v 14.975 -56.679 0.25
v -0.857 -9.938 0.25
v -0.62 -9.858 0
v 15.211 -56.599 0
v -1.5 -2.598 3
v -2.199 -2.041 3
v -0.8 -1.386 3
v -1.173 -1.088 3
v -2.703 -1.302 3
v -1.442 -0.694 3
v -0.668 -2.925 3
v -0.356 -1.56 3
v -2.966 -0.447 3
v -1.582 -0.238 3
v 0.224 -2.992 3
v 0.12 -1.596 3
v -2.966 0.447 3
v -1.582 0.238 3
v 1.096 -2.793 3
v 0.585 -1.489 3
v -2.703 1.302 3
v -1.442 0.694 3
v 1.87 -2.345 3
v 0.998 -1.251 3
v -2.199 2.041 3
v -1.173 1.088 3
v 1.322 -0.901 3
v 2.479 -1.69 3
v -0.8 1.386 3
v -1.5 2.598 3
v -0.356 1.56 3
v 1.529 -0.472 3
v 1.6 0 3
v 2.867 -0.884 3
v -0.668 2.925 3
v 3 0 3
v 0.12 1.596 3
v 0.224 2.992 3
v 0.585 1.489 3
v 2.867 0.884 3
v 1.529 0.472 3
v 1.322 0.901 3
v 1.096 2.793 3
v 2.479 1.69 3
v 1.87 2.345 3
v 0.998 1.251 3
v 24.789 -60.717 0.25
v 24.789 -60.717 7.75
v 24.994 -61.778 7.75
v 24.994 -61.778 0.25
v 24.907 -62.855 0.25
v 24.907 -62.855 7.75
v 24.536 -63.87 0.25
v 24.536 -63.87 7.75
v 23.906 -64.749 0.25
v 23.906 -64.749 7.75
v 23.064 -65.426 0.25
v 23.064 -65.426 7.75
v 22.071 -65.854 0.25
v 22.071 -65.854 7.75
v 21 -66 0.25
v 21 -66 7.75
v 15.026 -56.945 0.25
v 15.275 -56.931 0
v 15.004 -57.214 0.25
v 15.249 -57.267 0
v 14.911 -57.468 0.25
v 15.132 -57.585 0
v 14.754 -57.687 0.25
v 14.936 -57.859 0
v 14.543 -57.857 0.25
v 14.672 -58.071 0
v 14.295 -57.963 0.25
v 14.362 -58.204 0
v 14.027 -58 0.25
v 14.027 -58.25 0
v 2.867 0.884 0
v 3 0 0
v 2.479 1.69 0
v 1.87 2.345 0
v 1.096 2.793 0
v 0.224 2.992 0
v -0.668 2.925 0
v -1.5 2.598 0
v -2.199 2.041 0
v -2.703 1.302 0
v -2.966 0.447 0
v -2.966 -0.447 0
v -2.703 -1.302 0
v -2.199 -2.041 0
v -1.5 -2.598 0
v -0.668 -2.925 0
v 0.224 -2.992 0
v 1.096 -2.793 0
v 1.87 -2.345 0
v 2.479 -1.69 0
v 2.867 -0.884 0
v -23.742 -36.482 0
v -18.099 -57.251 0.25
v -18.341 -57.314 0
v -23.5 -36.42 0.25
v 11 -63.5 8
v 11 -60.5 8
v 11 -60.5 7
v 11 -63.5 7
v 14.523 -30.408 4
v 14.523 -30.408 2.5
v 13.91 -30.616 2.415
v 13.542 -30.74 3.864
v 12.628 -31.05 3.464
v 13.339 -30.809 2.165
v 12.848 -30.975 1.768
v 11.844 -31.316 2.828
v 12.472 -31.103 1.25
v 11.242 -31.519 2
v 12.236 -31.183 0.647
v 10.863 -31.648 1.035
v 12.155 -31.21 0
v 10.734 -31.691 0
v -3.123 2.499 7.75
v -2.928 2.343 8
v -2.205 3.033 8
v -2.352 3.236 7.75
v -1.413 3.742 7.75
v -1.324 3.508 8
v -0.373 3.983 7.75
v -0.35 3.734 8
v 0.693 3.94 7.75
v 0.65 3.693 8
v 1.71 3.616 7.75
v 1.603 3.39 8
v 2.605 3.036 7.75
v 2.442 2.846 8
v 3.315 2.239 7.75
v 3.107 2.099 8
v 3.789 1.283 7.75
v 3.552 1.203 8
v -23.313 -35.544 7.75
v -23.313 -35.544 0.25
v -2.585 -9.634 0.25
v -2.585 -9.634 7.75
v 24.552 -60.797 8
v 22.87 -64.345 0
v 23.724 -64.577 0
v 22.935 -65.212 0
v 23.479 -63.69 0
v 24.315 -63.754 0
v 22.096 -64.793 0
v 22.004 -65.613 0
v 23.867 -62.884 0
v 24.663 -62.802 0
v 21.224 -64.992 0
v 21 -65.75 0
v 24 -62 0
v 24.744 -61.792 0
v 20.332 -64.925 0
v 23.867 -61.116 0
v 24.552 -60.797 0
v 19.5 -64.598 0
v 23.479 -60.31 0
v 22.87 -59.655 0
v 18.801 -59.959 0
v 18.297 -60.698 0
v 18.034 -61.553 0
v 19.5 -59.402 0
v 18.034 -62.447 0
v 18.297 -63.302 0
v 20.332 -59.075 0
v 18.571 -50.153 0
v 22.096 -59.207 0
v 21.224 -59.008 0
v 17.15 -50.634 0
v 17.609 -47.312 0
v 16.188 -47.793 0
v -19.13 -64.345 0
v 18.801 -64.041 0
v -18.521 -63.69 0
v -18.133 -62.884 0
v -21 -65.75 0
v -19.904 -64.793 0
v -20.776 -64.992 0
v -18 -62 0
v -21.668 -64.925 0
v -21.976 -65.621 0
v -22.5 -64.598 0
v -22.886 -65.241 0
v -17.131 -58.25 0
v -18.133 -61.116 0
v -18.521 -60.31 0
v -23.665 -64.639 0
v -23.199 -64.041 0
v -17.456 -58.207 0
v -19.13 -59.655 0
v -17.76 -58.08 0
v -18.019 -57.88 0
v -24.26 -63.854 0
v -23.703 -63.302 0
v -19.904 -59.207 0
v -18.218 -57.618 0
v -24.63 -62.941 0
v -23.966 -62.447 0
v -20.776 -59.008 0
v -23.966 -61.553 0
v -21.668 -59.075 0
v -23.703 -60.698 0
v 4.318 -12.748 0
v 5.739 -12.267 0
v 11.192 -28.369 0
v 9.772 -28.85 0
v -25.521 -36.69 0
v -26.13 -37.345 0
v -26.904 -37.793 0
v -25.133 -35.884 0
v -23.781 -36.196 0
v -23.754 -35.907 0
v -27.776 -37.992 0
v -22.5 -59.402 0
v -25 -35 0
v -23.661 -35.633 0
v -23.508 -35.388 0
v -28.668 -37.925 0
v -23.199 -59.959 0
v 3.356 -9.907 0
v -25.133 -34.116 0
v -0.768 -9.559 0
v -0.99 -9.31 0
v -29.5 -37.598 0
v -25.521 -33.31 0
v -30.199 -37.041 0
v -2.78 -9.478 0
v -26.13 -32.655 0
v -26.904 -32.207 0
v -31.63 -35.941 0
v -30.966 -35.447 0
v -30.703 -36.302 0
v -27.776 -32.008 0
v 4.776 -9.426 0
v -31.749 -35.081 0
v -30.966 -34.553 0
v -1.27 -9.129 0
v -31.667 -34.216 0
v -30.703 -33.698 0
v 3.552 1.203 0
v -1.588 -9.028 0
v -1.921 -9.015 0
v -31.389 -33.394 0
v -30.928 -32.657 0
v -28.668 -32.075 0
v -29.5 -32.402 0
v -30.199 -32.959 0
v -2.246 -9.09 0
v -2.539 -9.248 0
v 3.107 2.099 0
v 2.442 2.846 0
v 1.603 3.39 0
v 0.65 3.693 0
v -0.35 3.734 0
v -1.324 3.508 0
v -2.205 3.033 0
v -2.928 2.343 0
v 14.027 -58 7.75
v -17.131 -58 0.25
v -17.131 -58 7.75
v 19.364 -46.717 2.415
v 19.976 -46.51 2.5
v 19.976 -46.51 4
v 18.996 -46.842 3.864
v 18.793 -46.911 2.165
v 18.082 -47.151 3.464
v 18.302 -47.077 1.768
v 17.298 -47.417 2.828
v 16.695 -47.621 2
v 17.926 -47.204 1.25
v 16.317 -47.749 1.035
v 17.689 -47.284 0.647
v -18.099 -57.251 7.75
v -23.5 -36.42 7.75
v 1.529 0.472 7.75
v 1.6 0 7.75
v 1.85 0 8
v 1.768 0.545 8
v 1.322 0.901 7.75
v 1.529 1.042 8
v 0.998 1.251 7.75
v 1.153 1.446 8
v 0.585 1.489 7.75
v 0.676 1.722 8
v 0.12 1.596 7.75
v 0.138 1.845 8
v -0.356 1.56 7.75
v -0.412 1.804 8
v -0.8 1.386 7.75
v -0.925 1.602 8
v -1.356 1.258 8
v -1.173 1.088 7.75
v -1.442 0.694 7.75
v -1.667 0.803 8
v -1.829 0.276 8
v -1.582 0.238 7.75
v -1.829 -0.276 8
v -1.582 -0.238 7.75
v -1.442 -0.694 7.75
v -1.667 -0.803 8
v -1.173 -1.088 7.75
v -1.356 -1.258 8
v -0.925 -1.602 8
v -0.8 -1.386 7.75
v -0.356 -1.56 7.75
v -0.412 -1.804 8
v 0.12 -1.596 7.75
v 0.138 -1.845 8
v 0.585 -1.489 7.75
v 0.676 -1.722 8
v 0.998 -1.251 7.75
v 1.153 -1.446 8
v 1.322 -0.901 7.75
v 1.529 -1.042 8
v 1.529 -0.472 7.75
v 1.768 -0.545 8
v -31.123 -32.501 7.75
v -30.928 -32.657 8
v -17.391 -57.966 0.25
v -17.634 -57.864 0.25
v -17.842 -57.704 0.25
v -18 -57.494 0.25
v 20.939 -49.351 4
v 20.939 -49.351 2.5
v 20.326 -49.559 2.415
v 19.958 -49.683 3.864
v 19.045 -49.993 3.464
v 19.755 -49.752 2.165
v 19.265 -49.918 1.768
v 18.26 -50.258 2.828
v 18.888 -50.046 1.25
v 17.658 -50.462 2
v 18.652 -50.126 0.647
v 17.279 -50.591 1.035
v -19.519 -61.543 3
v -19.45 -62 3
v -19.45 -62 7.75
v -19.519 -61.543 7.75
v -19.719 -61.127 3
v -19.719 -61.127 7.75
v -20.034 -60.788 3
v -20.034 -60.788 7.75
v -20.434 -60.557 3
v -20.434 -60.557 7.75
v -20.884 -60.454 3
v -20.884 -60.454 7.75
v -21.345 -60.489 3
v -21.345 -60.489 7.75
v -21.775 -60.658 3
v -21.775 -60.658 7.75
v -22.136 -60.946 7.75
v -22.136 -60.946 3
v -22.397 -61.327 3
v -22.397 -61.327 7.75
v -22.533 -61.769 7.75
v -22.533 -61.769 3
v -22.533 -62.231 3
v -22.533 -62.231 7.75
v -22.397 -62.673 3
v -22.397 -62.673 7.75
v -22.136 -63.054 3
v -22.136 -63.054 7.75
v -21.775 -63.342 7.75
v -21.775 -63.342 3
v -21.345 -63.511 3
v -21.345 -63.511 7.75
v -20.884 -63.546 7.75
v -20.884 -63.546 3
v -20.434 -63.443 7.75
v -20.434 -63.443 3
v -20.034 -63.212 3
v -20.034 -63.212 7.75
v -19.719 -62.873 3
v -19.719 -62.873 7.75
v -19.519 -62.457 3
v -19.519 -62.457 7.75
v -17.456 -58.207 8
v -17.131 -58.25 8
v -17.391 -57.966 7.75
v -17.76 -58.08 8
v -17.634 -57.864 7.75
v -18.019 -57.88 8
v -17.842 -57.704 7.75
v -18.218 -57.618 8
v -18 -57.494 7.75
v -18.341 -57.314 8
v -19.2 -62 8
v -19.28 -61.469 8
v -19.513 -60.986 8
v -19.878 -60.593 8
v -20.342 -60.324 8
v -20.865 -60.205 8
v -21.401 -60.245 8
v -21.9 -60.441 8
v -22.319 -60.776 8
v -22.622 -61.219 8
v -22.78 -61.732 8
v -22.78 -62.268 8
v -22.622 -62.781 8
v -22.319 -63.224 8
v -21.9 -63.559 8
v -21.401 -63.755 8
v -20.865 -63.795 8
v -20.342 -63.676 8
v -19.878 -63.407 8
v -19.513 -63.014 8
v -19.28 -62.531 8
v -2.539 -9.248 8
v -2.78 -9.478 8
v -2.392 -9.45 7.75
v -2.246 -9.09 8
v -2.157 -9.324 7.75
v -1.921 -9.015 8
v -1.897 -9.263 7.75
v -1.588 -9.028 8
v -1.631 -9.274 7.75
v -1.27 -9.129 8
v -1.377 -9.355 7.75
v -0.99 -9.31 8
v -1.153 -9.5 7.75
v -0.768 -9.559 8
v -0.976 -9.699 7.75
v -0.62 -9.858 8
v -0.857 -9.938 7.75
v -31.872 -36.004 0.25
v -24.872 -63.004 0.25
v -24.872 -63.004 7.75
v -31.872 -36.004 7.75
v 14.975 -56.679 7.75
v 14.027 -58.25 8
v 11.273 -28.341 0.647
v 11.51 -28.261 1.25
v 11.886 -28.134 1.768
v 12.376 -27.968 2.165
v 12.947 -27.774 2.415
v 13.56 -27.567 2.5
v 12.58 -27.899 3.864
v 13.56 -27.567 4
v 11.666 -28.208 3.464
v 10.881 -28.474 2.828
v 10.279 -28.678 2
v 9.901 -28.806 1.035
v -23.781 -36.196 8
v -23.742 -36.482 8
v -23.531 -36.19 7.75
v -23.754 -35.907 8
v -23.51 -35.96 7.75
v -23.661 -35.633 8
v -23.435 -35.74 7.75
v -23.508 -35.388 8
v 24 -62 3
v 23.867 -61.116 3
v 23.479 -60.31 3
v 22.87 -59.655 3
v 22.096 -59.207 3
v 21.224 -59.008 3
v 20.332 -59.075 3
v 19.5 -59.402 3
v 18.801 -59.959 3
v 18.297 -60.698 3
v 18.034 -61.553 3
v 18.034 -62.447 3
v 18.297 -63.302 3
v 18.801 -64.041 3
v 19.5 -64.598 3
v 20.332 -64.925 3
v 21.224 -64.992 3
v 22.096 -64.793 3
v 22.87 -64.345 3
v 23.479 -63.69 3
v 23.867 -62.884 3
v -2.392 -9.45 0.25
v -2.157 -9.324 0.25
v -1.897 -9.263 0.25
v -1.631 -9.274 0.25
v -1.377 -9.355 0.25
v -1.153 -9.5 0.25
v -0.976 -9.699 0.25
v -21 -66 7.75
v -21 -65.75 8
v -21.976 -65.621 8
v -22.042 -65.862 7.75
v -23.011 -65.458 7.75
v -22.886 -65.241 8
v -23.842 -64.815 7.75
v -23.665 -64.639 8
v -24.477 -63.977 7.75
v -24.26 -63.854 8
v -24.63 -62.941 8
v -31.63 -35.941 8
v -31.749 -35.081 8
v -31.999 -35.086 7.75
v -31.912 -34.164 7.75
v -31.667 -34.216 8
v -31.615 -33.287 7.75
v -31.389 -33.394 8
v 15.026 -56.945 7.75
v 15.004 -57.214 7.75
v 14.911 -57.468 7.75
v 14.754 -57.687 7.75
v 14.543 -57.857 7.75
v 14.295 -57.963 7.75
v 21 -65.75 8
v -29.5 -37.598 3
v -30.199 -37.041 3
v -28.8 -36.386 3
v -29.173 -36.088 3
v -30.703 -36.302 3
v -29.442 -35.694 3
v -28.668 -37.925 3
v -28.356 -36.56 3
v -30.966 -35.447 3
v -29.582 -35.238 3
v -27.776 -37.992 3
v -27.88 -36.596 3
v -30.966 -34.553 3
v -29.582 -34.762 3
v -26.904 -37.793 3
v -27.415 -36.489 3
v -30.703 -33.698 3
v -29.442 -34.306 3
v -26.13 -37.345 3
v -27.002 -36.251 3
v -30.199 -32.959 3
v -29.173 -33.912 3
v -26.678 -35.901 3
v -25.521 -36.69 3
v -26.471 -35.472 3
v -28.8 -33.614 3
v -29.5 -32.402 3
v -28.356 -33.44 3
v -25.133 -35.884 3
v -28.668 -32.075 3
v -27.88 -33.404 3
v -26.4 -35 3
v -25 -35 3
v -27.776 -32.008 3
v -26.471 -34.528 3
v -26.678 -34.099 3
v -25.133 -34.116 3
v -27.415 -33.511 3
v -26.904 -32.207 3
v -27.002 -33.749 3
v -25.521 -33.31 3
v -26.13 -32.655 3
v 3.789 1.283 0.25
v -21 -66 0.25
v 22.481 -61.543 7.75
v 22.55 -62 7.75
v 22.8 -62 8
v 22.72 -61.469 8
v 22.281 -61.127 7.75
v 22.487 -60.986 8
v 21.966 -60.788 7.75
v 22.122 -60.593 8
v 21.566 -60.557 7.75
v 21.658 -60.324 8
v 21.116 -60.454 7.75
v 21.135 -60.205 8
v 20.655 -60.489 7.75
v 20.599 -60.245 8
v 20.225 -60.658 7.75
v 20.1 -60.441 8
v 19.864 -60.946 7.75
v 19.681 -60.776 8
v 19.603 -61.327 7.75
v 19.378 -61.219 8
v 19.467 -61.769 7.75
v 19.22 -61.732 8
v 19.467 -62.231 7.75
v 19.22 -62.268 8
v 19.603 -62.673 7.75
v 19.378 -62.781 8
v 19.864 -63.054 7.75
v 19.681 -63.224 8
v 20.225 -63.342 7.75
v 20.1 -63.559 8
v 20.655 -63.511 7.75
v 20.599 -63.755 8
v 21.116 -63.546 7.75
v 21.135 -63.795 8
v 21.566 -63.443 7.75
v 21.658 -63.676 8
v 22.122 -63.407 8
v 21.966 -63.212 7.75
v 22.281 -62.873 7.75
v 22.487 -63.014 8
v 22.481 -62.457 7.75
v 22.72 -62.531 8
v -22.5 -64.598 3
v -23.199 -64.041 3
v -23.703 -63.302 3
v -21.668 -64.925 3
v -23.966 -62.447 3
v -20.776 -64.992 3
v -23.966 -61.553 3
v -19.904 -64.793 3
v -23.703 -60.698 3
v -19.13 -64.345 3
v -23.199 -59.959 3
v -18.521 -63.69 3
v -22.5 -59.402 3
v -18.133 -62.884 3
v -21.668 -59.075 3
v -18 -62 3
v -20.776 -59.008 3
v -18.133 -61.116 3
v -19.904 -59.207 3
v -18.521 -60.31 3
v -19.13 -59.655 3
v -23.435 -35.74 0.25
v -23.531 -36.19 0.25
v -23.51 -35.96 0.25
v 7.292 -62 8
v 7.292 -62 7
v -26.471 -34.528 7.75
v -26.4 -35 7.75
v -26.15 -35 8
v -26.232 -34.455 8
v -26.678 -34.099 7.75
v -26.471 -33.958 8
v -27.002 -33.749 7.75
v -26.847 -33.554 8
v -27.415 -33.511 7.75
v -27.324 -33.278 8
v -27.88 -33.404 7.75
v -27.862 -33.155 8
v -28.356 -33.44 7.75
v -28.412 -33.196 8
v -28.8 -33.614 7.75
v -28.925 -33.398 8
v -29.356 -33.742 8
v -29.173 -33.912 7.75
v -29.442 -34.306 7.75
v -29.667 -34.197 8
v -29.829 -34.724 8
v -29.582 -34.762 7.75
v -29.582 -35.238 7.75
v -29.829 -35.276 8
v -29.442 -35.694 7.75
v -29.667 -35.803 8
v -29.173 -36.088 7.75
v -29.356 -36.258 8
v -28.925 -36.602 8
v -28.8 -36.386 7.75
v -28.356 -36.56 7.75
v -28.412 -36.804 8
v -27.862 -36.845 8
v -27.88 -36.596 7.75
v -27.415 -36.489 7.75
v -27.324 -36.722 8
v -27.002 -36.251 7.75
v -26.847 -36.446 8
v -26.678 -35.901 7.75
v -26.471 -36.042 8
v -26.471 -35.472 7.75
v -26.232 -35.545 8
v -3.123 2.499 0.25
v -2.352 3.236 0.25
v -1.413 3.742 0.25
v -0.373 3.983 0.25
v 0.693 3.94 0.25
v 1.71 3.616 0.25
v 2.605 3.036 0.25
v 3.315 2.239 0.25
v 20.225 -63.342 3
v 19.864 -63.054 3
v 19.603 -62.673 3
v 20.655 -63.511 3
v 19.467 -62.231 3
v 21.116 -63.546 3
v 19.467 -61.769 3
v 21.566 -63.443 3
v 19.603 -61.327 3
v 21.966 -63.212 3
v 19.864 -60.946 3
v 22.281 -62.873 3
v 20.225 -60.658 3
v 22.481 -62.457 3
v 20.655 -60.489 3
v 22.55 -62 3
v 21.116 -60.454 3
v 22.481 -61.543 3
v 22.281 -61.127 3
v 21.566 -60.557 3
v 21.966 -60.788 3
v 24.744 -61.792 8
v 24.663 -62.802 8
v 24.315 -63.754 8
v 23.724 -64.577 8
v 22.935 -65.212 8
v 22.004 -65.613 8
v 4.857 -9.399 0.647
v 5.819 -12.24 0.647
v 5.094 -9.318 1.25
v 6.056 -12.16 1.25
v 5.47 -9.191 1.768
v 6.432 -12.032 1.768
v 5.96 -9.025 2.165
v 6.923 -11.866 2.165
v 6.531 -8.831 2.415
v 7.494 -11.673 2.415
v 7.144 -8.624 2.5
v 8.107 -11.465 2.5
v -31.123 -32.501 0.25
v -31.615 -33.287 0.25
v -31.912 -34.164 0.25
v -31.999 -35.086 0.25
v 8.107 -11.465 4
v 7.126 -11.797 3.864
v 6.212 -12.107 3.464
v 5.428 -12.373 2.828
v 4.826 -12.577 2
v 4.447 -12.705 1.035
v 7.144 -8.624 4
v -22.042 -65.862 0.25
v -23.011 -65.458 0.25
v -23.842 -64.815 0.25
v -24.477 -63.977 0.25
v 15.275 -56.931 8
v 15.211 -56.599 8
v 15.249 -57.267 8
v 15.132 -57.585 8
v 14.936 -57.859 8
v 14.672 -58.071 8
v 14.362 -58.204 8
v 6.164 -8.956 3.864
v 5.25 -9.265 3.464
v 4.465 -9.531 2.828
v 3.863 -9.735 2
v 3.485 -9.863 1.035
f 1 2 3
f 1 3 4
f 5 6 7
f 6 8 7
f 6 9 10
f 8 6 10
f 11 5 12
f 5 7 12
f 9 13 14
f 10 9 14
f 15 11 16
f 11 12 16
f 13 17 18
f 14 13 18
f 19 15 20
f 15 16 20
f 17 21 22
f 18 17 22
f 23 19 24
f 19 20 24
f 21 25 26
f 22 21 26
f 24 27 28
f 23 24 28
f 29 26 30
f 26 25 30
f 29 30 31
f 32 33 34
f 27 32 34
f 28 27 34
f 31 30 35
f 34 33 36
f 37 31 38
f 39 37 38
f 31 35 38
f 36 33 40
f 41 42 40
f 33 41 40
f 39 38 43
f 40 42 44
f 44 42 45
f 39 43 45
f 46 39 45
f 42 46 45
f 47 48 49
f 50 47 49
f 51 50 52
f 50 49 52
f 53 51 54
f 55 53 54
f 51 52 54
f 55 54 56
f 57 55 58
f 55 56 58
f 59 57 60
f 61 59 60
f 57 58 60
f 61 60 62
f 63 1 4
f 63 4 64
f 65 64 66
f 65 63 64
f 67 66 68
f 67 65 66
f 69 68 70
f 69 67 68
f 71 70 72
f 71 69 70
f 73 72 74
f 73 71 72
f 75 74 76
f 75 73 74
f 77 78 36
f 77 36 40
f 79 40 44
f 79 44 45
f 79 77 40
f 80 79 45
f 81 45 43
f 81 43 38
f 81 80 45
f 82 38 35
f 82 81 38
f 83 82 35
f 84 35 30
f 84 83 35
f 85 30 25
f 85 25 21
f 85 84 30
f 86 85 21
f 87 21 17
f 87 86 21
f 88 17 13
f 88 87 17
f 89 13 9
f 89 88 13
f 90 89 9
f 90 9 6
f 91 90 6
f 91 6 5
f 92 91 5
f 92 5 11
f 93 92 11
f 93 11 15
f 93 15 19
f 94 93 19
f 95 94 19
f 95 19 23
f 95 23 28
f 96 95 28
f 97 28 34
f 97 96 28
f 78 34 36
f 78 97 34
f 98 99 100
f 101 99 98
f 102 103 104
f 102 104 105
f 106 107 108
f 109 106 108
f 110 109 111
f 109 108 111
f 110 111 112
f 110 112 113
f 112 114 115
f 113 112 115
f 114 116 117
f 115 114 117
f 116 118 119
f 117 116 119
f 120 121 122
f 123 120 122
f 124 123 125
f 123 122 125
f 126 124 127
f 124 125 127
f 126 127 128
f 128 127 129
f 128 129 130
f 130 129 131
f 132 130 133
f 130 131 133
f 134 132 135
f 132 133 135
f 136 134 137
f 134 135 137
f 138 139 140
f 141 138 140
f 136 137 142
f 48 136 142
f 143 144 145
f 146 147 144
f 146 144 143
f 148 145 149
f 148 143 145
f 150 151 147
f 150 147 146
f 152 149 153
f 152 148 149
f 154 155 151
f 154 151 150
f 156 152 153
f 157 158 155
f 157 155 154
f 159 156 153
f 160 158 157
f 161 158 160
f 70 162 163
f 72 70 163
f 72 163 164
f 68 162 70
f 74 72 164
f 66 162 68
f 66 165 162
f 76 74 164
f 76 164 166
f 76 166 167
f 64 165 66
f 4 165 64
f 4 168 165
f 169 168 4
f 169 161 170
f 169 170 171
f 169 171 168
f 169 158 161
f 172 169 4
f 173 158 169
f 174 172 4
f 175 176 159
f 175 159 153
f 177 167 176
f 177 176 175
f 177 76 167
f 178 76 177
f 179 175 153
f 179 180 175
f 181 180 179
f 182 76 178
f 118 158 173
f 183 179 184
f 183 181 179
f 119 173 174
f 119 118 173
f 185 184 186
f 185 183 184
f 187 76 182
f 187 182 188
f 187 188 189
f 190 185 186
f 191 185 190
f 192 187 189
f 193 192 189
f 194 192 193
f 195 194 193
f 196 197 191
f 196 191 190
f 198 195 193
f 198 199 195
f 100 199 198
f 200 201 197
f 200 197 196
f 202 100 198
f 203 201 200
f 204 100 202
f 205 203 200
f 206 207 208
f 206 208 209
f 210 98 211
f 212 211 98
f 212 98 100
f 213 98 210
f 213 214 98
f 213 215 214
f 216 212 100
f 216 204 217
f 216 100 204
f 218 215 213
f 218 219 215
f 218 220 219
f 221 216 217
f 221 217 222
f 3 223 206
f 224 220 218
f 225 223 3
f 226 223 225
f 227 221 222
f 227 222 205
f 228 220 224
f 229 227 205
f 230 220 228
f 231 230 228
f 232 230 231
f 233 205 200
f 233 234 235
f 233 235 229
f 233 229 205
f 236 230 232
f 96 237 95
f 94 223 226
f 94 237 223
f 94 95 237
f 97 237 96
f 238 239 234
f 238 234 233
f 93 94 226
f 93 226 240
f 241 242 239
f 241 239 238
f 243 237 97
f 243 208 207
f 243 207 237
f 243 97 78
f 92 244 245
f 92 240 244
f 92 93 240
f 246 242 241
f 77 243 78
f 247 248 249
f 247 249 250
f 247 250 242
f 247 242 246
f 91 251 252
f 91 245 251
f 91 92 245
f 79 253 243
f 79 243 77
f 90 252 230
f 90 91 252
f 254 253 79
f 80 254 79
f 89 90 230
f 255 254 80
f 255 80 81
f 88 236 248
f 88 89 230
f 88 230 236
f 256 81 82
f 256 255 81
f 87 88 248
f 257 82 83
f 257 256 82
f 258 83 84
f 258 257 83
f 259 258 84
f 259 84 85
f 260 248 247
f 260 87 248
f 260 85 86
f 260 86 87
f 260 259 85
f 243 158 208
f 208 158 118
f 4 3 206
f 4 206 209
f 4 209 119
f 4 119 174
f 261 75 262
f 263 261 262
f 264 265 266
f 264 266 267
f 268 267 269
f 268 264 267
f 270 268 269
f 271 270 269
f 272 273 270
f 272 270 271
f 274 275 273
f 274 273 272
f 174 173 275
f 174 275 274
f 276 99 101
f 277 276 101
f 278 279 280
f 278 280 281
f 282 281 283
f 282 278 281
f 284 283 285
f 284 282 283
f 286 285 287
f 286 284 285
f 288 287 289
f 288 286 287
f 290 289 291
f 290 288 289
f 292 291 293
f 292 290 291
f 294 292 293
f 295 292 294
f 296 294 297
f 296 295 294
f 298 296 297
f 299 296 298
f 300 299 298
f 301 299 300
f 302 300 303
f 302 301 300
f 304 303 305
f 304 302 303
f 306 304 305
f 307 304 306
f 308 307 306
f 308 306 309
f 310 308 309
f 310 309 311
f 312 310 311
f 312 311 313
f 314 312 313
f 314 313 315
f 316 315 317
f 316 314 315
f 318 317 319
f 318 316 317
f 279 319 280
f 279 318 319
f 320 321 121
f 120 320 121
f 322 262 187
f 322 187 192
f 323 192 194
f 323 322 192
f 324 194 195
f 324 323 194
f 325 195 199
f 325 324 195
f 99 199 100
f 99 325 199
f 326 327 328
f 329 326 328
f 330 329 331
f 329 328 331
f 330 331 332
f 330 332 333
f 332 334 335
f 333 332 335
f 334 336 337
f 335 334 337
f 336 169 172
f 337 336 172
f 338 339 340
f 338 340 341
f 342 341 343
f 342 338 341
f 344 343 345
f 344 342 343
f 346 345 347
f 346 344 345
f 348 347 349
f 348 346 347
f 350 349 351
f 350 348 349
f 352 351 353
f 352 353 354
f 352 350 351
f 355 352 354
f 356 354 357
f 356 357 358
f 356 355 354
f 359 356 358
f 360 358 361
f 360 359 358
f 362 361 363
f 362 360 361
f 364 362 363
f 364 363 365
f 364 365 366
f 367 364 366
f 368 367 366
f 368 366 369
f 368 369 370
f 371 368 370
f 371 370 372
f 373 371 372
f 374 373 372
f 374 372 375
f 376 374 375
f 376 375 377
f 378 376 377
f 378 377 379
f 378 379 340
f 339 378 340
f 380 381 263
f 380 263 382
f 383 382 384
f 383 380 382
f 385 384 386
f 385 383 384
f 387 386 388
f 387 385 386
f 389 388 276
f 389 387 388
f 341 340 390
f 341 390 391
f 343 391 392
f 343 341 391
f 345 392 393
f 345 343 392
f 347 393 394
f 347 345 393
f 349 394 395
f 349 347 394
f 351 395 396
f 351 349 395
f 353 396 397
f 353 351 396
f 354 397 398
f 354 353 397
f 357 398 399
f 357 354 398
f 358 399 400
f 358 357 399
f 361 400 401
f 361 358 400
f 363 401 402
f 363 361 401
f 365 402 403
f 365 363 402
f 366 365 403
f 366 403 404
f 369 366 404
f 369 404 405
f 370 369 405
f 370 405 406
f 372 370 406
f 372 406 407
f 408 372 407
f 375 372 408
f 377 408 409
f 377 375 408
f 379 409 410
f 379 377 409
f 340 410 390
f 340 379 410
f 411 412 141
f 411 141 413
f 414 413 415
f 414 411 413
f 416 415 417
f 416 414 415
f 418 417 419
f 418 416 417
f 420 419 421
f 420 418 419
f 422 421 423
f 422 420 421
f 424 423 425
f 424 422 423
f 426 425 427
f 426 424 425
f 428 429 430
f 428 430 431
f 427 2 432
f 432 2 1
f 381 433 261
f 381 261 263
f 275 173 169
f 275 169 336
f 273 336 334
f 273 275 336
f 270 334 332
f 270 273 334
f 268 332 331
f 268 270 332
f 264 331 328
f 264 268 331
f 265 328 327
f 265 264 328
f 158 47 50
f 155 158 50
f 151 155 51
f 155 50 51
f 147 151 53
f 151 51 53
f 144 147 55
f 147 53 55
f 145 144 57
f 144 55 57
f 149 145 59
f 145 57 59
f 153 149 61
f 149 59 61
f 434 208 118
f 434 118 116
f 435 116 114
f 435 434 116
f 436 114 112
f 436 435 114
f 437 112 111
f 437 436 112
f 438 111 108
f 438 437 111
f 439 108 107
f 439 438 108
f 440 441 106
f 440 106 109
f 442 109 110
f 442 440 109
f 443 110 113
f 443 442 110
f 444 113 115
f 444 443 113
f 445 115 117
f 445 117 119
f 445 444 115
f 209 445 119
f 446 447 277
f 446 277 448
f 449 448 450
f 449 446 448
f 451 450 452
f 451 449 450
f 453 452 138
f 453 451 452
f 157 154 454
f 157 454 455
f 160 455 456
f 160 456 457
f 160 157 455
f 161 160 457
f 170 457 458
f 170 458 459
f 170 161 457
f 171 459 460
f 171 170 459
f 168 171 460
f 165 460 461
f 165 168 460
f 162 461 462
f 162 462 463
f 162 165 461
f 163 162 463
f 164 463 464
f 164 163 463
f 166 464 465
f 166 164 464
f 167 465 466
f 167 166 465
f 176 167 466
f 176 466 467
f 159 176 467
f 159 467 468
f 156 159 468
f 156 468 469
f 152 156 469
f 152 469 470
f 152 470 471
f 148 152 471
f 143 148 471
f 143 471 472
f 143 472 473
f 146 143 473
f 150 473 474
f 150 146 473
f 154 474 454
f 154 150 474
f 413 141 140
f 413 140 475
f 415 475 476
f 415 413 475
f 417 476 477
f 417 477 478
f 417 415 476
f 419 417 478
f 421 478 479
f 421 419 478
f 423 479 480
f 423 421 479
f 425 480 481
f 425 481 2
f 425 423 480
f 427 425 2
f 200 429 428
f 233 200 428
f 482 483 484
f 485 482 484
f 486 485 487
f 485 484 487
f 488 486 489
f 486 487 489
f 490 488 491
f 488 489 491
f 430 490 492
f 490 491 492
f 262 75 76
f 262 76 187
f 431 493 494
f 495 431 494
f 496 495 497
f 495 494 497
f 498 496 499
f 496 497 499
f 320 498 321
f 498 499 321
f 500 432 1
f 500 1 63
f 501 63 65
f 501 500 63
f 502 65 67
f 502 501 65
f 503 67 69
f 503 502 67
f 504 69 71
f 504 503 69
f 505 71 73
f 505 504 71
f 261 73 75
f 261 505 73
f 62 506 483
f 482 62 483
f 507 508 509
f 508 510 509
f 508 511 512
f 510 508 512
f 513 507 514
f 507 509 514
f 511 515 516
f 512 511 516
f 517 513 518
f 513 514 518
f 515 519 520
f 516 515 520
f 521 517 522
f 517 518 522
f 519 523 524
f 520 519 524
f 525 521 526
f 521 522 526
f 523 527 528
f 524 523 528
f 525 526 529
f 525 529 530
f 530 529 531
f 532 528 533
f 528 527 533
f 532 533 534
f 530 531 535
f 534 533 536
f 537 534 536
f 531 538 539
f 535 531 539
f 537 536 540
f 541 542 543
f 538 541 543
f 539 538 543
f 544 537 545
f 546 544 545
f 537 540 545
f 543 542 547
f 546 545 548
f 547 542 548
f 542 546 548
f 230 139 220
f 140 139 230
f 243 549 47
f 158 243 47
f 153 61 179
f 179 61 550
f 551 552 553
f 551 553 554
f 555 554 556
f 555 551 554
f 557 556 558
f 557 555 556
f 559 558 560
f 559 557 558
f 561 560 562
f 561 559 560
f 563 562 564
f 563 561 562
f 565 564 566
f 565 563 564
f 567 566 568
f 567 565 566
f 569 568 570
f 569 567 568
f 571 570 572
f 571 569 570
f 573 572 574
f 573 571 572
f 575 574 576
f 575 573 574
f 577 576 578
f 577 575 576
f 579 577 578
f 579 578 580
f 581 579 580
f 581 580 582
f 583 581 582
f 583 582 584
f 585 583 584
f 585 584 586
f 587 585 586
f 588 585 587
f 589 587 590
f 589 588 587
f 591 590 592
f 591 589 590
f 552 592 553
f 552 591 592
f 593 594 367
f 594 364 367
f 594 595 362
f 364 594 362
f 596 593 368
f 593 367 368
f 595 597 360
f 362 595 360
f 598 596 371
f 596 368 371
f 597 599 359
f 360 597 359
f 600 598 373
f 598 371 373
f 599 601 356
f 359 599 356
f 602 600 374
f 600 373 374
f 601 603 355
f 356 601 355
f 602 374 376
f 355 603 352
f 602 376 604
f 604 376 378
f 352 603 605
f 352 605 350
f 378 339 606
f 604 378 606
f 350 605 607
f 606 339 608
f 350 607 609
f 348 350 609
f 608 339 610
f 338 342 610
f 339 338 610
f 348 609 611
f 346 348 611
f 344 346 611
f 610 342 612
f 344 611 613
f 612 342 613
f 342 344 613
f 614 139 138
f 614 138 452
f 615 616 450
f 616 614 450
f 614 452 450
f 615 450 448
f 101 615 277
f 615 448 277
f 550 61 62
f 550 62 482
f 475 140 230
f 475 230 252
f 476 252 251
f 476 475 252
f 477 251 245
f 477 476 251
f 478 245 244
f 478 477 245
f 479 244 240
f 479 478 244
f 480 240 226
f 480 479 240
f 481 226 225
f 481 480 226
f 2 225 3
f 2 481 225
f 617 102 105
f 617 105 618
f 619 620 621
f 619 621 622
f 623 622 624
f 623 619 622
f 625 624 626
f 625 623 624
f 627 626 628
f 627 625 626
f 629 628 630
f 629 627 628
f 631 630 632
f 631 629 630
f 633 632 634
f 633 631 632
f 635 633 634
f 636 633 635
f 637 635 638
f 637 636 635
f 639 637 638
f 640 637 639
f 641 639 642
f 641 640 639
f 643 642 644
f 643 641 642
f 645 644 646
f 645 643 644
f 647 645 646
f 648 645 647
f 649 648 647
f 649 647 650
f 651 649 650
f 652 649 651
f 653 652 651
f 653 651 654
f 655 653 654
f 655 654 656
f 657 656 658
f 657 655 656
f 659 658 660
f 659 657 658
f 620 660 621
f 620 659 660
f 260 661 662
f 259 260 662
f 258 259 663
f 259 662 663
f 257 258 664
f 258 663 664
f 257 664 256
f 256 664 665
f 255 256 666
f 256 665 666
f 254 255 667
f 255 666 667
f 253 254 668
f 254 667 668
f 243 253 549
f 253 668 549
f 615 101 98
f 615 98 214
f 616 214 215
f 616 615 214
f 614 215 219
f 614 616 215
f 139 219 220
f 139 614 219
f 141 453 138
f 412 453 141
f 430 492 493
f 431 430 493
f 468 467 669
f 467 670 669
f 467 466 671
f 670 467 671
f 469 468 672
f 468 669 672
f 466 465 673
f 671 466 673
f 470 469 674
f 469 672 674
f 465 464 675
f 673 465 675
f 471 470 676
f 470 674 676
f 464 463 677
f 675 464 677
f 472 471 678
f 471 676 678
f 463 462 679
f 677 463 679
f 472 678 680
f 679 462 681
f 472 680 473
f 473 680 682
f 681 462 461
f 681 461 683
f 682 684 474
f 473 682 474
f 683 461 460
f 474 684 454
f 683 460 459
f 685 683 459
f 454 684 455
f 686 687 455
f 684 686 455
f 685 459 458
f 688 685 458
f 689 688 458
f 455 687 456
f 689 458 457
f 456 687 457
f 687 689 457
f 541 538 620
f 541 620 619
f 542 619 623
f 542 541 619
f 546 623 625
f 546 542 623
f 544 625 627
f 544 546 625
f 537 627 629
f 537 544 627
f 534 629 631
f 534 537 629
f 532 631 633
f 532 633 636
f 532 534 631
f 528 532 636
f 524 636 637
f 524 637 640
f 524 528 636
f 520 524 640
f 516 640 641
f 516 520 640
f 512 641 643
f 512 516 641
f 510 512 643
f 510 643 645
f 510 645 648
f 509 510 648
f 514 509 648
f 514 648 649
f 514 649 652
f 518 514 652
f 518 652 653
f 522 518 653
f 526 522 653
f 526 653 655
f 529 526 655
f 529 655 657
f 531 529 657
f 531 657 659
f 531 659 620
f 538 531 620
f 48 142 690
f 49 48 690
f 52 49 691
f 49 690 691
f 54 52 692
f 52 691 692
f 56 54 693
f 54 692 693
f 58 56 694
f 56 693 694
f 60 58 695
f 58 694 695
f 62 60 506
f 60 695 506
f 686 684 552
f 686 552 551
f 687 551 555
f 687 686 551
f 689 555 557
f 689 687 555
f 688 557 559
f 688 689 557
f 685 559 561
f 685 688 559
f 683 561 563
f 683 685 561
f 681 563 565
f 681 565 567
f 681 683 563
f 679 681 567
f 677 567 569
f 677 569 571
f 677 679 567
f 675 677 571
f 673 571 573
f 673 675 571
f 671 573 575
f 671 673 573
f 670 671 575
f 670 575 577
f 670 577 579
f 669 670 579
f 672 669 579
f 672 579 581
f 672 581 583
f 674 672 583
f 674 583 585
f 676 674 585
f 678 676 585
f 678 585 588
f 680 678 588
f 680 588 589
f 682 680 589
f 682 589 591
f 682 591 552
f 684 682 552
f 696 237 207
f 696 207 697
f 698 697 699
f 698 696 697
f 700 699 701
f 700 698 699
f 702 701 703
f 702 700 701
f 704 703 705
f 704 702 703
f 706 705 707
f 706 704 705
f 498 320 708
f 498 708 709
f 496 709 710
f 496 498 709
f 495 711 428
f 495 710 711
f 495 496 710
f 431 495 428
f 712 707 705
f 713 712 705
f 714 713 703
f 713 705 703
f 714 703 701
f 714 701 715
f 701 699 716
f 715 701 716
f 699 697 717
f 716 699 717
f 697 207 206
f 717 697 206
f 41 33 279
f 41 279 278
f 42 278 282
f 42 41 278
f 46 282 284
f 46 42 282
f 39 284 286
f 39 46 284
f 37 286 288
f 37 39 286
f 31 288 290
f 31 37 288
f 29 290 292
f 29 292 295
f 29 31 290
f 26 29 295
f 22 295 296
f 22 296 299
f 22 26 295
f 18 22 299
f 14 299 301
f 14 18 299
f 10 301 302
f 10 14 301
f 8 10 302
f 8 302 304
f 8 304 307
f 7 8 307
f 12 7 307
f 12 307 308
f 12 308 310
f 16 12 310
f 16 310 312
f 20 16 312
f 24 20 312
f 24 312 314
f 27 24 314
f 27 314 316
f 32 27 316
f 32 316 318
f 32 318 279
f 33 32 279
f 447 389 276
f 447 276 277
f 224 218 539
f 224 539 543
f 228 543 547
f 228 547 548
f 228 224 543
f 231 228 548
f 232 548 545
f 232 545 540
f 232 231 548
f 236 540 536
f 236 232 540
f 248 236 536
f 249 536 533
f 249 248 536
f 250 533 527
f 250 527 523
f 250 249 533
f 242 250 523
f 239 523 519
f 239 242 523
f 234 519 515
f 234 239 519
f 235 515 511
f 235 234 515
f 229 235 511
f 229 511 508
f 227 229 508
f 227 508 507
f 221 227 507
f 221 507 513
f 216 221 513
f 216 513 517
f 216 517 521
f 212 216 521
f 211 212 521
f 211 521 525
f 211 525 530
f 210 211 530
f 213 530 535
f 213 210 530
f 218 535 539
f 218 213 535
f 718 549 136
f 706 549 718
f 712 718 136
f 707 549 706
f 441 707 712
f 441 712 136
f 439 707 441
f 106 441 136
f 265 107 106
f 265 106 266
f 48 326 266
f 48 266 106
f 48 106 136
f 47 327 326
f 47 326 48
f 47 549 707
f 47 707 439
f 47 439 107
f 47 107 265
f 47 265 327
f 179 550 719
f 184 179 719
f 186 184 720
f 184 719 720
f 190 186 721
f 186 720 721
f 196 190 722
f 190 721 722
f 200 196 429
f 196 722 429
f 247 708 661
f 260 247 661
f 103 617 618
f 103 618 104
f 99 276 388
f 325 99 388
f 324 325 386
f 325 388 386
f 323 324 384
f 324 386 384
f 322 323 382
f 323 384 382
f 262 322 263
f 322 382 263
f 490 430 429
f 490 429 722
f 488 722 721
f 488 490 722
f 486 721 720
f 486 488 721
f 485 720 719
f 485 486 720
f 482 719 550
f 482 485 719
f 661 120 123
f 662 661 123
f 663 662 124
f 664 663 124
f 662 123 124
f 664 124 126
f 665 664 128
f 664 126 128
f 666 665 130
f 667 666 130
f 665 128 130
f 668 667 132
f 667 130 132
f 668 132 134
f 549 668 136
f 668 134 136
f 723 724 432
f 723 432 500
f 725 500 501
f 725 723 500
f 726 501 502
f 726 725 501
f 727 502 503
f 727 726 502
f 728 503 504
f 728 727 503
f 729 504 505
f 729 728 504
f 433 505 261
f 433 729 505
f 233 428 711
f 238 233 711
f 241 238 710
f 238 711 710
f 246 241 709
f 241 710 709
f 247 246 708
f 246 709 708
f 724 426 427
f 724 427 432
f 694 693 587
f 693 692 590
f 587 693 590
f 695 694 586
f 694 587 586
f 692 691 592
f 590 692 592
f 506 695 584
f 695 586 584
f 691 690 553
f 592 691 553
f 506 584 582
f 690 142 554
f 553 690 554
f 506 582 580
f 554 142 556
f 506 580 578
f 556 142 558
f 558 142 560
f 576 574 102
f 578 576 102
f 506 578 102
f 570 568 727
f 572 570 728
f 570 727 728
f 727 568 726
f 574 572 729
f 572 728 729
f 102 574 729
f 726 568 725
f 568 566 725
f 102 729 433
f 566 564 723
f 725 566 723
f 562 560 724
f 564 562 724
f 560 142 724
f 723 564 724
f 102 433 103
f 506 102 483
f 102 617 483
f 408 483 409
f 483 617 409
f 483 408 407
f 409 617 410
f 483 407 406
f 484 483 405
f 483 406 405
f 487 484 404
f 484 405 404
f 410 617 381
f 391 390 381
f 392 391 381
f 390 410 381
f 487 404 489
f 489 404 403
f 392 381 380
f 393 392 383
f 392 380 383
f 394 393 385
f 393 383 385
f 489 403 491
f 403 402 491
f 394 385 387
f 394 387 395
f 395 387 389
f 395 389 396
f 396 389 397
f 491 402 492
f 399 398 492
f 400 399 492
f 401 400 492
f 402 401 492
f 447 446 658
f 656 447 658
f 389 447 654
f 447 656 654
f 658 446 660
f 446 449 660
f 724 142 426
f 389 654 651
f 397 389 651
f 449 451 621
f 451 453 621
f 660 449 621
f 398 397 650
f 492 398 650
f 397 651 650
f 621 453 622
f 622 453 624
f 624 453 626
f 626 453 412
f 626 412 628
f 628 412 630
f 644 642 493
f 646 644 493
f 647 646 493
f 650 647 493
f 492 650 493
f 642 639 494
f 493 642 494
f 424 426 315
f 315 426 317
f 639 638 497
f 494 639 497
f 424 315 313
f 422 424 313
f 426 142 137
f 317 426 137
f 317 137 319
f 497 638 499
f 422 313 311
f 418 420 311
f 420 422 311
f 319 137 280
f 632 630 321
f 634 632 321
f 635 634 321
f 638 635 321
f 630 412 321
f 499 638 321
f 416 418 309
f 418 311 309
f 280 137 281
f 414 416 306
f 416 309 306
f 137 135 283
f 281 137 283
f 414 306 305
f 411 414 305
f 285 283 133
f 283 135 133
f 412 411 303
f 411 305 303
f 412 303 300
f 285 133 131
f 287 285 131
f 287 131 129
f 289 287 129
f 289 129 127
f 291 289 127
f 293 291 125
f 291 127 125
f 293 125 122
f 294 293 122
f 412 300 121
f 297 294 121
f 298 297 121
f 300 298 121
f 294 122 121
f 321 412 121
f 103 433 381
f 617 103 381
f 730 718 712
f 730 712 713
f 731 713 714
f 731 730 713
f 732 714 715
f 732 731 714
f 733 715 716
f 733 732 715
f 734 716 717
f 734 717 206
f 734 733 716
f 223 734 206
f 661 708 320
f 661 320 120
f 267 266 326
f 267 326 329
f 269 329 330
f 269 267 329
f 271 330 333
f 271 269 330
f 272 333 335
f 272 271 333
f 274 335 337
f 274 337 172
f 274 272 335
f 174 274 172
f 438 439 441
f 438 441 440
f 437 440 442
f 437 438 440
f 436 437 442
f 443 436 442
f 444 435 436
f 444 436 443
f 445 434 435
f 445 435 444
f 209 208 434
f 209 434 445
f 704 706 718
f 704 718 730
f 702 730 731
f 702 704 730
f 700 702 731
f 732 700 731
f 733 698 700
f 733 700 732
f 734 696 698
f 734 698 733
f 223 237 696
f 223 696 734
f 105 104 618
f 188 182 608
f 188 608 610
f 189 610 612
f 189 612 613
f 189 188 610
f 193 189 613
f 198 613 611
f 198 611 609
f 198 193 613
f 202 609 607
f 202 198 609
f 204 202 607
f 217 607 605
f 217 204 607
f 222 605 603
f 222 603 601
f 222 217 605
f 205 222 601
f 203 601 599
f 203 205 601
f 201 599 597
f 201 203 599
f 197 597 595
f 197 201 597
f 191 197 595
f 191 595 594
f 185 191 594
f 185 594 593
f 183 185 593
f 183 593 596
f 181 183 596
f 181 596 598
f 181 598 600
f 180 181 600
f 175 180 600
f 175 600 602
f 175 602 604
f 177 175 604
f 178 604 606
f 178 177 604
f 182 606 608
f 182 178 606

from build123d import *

# Parameters (mm, degrees)
SZKIC1_R                    = 1.55
SZKIC1_R_2                  = 1.6
DODANIE_WYCI_GNI_CIE1_DEPTH = 8
ZAOKR_GLENIE1_R             = 4
SZKIC2_R                    = 3
WYTNIJ_WYCI_GNI_CIE1_DEPTH  = 3
ZAOKR_GLENIE2_R             = 1
SFAZOWANIE1_SIZE            = 0.25
WYTNIJ_WYCI_GNI_CIE2_DEPTH  = 1
WYTNIJ_WYCI_GNI_CIE3_DEPTH  = 3
SZYK_LINIOWY1_COUNT         = 3
SZYK_LINIOWY1_PITCH         = 20


with BuildPart() as part:
    # Szkic1 → Dodanie-wyciągnięcie1 (new body)
    with BuildSketch(Plane.XY):
        Polygon((-32.374614688, -34.065144123), (1.443331859, 8.207289062), (26.5780588, -66), (-24.095207609, -66), align=None)
        with Locations((-21, -62)):
            Circle(SZKIC1_R, mode=Mode.SUBTRACT)
        with Locations((21, -62)):
            Circle(SZKIC1_R, mode=Mode.SUBTRACT)
        Circle(SZKIC1_R_2, mode=Mode.SUBTRACT)
        with Locations((-28, -35)):
            Circle(SZKIC1_R_2, mode=Mode.SUBTRACT)
        Polygon((-23.625385312, -35.934855877), (-1.443331859, -8.207289062), (15.4219412, -58), (-17.904792391, -58), align=None, mode=Mode.SUBTRACT)
    extrude(amount=DODANIE_WYCI_GNI_CIE1_DEPTH)

    # Zaokrąglenie1
    zaokr_glenie1_edges = [part.edges().sort_by_distance(p)[0] for p in [
        (-32.374614688, -34.065144123, 4),
        (1.443331859, 8.207289062, 4),
        (26.5780588, -66, 4),
        (-24.095207609, -66, 4),
    ]]
    fillet(zaokr_glenie1_edges, radius=ZAOKR_GLENIE1_R)

    # Szkic2 → Wytnij-wyciągnięcie1 (cut)
    with BuildSketch(Plane.XY):
        Circle(SZKIC2_R)
        with Locations((-28, -35)):
            Circle(SZKIC2_R)
        with Locations((-21, -62)):
            Circle(SZKIC2_R)
        with Locations((21, -62)):
            Circle(SZKIC2_R)
    extrude(amount=WYTNIJ_WYCI_GNI_CIE1_DEPTH, mode=Mode.SUBTRACT)

    # Zaokrąglenie2
    zaokr_glenie2_edges = [part.edges().sort_by_distance(p)[0] for p in [
        (-23.625385312, -35.934855877, 4),
        (-17.904792391, -58, 4),
        (15.4219412, -58, 4),
        (-1.443331859, -8.207289062, 4),
    ]]
    fillet(zaokr_glenie2_edges, radius=ZAOKR_GLENIE2_R)

    # Sfazowanie1
    sfazowanie1_edges = [part.edges().sort_by_distance(p)[0] for p in [
        (7.058775414, -33.30874863, 0),
        (7.058775414, -33.30874863, 8),
        (-20.799357962, -46.835247082, 0),
        (-20.799357962, -46.835247082, 8),
        (-12.948817041, -22.589145539, 0),
        (-12.948817041, -22.589145539, 8),
        (14.84007865, -57.582749074, 0),
        (14.84007865, -57.582749074, 8),
        (-17.742969998, -57.790873618, 0),
        (-17.742969998, -57.790873618, 8),
        (-23.509651218, -35.959588272, 0),
        (-23.509651218, -35.959588272, 8),
        (-1.630962951, -9.274224983, 0),
        (-1.630962951, -9.274224983, 8),
        (-22.55, -62, 8),
        (19.45, -62, 8),
        (-1.6, 0, 8),
        (-29.6, -35, 8),
        (0, -66, 0),
        (0, -66, 8),
        (-28.371987593, -49.503848635, 0),
        (-17.123475238, -15.00121981, 0),
        (14.288578303, -29.716771865, 0),
        (0.692807492, 3.939545377, 0),
        (24.2506086, -64.330996296, 0),
        (-31.911678313, -34.164073702, 0),
        (-23.44791804, -65.163494471, 0),
        (-28.371987593, -49.503848635, 8),
        (14.288578303, -29.716771865, 8),
        (-17.123475238, -15.00121981, 8),
        (0.692807492, 3.939545377, 8),
        (24.2506086, -64.330996296, 8),
        (-31.911678313, -34.164073702, 8),
        (-23.44791804, -65.163494471, 8),
        (-1.551781994, -58, 0),
        (-1.551781994, -58, 8),
    ]]
    chamfer(sfazowanie1_edges, length=SFAZOWANIE1_SIZE)

    # Szkic3 → Wytnij-wyciągnięcie2 (cut)
    with BuildSketch(Plane(origin=(0, 0, 8), x_dir=(-1, 0, 0), z_dir=(0, 0, -1))):
        Polygon((-11, -60.5), (-11, -63.5), (-7.291900756, -62), align=None)
    extrude(amount=WYTNIJ_WYCI_GNI_CIE2_DEPTH, mode=Mode.SUBTRACT)

    # Szkic4 → Wytnij-wyciągnięcie3 (cut)
    with BuildSketch(Plane(origin=(19.976472797, -46.509603231, 0.25), x_dir=(0.9471445756278131, 0.3208070336803883, 0), z_dir=(-0.3208070336803883, 0.9471445756278131, 0))):
        with BuildLine():
            Line((-4, 0.25), (-2.5, 0.25))
            ThreePointArc((-2.5, 0.25), (-1.767766953, -1.517766953), (0, -2.25))
            Line((0, -2.25), (0, -3.75))
            ThreePointArc((0, -3.75), (-2.828427125, -2.578427125), (-4, 0.25))
        make_face()
    wytnij_wyci_gni_cie3 = extrude(amount=-WYTNIJ_WYCI_GNI_CIE3_DEPTH, mode=Mode.SUBTRACT)

    # Szyk liniowy1: Wytnij-wyciągnięcie3 ×3
    with Locations(*[Vector(-0.3208070336803885, 0.9471445756278131, 0) * (i * SZYK_LINIOWY1_PITCH) for i in range(1, SZYK_LINIOWY1_COUNT)]):
        add(wytnij_wyci_gni_cie3, mode=Mode.SUBTRACT)


solid = part.part
